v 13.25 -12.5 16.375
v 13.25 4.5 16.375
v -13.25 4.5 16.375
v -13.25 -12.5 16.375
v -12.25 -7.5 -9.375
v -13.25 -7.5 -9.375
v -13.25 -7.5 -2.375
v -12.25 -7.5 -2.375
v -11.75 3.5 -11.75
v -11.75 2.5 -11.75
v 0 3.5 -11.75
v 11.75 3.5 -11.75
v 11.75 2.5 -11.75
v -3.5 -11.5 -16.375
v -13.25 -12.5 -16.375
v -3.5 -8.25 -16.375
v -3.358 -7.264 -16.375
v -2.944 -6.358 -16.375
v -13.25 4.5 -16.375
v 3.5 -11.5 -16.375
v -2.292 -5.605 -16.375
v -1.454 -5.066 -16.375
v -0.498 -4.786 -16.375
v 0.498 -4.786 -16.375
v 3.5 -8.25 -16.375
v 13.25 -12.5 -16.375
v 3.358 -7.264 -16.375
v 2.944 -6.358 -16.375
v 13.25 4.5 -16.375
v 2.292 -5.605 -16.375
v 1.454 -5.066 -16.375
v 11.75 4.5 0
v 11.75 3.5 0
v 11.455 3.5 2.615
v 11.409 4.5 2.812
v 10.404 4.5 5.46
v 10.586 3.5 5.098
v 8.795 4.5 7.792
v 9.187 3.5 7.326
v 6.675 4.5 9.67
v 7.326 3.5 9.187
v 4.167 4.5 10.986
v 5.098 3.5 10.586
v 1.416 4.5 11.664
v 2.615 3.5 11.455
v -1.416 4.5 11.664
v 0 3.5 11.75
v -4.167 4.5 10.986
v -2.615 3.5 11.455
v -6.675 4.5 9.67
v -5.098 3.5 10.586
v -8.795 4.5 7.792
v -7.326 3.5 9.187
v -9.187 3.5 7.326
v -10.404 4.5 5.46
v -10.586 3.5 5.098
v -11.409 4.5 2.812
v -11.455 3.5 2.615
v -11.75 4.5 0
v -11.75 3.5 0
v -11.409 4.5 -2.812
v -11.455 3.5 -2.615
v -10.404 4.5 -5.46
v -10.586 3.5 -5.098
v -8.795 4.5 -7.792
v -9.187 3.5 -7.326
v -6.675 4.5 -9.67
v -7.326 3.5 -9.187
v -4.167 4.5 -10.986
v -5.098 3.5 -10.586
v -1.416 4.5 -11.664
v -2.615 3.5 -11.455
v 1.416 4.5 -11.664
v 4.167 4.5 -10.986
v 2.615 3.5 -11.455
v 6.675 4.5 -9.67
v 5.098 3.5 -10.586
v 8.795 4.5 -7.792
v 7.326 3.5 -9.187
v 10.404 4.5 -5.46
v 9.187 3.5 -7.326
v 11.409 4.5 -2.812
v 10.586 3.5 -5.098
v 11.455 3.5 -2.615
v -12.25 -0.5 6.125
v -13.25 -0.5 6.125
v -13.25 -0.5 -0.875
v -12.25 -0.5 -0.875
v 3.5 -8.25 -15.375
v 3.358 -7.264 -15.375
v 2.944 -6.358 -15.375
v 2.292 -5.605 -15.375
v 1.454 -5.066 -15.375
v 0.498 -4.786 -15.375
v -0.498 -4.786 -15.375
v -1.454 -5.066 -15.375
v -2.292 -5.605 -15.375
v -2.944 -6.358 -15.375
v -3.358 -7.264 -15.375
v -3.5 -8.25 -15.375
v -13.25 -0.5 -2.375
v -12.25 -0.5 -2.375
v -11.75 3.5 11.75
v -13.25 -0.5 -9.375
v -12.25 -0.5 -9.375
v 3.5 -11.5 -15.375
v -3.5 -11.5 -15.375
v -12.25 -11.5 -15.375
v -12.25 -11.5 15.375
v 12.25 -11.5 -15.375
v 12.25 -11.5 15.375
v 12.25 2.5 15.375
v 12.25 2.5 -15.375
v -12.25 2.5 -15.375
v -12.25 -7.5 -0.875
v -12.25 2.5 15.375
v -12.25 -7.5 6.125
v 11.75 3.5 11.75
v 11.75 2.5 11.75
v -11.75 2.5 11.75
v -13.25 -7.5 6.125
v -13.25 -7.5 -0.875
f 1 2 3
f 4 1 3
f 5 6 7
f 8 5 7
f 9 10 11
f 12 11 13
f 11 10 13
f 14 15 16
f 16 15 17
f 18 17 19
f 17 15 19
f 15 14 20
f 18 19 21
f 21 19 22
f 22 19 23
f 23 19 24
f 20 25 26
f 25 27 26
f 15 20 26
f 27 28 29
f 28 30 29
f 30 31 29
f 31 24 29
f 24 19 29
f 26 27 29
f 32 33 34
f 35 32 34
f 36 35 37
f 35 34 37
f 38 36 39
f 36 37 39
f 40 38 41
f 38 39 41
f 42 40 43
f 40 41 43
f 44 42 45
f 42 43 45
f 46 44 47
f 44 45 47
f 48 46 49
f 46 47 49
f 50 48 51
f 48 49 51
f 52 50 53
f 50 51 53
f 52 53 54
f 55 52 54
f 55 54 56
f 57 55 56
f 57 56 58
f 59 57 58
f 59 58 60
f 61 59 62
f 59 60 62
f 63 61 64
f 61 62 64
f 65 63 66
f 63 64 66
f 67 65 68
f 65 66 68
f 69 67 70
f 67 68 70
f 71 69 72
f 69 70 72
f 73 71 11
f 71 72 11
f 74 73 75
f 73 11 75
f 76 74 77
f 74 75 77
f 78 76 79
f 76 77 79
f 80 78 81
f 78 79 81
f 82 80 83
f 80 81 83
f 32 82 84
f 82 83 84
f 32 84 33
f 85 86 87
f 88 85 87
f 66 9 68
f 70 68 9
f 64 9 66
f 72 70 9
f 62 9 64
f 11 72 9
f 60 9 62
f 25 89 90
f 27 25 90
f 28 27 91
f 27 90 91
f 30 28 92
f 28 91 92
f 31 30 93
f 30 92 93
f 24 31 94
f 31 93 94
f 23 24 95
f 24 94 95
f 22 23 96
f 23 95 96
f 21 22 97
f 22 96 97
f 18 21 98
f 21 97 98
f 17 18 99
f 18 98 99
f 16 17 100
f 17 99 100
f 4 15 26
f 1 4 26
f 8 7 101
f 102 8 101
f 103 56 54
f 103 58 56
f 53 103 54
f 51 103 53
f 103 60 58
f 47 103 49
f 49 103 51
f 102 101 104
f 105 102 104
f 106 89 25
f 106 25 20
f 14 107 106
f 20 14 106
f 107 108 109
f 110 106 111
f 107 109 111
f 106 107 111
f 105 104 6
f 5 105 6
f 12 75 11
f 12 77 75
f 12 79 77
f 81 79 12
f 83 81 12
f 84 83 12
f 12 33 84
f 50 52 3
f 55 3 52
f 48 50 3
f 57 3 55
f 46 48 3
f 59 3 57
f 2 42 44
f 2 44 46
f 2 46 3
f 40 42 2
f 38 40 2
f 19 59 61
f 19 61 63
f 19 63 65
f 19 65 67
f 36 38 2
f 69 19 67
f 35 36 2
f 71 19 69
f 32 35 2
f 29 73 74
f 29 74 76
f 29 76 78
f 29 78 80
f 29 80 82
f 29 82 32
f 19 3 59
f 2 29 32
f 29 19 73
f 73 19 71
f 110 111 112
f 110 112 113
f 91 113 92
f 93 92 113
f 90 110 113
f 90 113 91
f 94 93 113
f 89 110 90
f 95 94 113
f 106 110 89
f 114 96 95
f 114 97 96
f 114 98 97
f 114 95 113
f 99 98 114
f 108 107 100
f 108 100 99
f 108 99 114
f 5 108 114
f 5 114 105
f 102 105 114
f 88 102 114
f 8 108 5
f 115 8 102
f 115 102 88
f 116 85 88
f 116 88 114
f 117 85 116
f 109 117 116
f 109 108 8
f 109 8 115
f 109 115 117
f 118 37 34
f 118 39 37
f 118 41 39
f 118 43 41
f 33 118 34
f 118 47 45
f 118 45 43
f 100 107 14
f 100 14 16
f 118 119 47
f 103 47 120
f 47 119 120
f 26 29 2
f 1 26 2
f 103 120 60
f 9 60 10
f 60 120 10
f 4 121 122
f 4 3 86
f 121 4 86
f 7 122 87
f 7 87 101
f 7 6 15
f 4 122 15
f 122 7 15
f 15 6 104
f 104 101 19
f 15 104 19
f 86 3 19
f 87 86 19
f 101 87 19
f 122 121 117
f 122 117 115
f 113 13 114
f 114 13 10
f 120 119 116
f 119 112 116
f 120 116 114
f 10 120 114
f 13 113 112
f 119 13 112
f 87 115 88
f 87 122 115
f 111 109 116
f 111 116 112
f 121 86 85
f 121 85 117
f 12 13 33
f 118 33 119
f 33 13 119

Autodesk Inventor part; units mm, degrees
ref_plane "YZ Plane" through (0, 0, 0) normal (1, 0, 0) x (0, 1, 0)
ref_plane "XZ Plane" through (0, 0, 0) normal (0, 1, 0) x (-1, 0, 0)
ref_plane "XY Plane" through (0, 0, 0) normal (0, 0, 1) x (1, 0, 0)
sketch "Sketch1" plane through (0, 0, 0) normal (0, 1, 0) x (-1, 0, 0)
  line L0 (-13.25, -16.375) -> (13.25, -16.375)
  line L1 (13.25, -16.375) -> (13.25, 16.375)
  line L2 (13.25, 16.375) -> (-13.25, 16.375)
  line L3 (-13.25, 16.375) -> (-13.25, -16.375)
  line L4 (-13.25, -16.375) -> (13.25, 16.375) construction
  line L5 (13.25, -16.375) -> (-13.25, 16.375) construction
  point P0 (0, 0)
  dimension "d0" = 26.5
  dimension "d1" = 32.75
extrude "Extrusion1" add sketch "Sketch1" along normal blind 3.5 and the other way blind 11.5
shell "Shell1" thickness 1 removed faces 1 at (4.4167, -11.5, 5.4583)
sketch "Sketch2" plane through (0, 3.5, 0) normal (0, 1, 0) x (1, 0, 0)
  line L0 (13.25, 16.375) -> (-13.25, 16.375) projected
  line L1 (-13.25, 16.375) -> (-13.25, -16.375) projected
  line L2 (-13.25, -16.375) -> (13.25, -16.375) projected
  line L3 (13.25, -16.375) -> (13.25, 16.375) projected
  point P0 (0, 0)
extrude "Extrusion2" add sketch "Sketch2" along normal blind 1
sketch "Sketch3" plane through (-12.25, 2.5, -15.375) normal (0, -1, 0) x (1, 0, 0)
  line L0 (24.5, 0) -> (0, 0) projected
  line L1 (24.5, 30.75) -> (24.5, 0) projected
  line L2 (0, 30.75) -> (24.5, 30.75) projected
  line L3 (0, 0) -> (0, 30.75) projected
  line L4 (0.5, 3.625) -> (24, 3.625)
  line L5 (24, 3.625) -> (24, 27.125)
  line L6 (24, 27.125) -> (0.5, 27.125)
  line L7 (0.5, 27.125) -> (0.5, 3.625)
  circle A0 centre (12.25, 15.375) radius 11.75
  dimension "d9" = 0.5
  dimension "d10" = 0.5
  dimension "d11" = 3.625
  dimension "d12" = 3.625
  dimension "d13" = 23.5
  dimension "d14" = 23.5
extrude "Extrusion3" cut sketch "Sketch3" against normal blind 1 contours L7 A0 L4 | A0 L5 L4 | A0 | L7 L6 A0 | A0 L6 L5
extrude "Extrusion4" cut sketch "Sketch3" against normal blind 2 contours A0
sketch "Sketch4" plane through (-12.25, -11.5, -15.375) normal (0, 0, 1) x (1, 0, 0)
  line L0 (24.5, 0) -> (0, 0) projected
  line L1 (8.75, 6.5) -> (15.75, 6.5)
  line L2 (15.75, 6.5) -> (15.75, 0)
  line L3 (15.75, 0) -> (8.75, 0)
  line L4 (8.75, 0) -> (8.75, 6.5)
  line L5 (8.75, 6.5) -> (15.75, 0) construction
  line L6 (15.75, 6.5) -> (8.75, 0) construction
  circle A0 centre (12.25, 3.25) radius 3.5
  line L7 (15.75, 3.25) -> (15.75, 3.25)
  line L8 (8.75, 3.25) -> (8.75, 3.25)
  point P0 (12.25, 11.5)
  point P1 (12.25, 3.25)
  point P2 (12.25, 0)
  point P3 (12.25, 0)
  point P4 (10.951, 0)
  point P5 (13.549, 0)
  point P6 (15.75, 0)
  point P7 (15.75, 3.25)
  point P8 (8.75, 3.25)
  point P9 (8.75, 0)
  dimension "d19" = 7
  dimension "d20" = 6.5
  dimension "d21" = 7
  dimension "d22" = 3.25
  dimension "d23" = 3.25
extrude "Extrusion5" cut sketch "Sketch4" against normal blind 2 contours L0 A0 L2 | A0 L0 | L0 A0 L1 | L0 L4 A0 | L1 A0
sketch "Sketch5" plane through (-13.25, -11.5, -16.375) normal (-1, 0, 0) x (0, 0, 1)
  line L0 (0, 16) -> (32.75, 16) projected
  line L1 (30, 11) -> (3.2984, 11)
  line L2 (7, 11) -> (7, 3)
  line L3 (1, 0) -> (1, 14) projected
  line L4 (7, 4) -> (14, 4)
  line L5 (14, 4) -> (14, 11)
  line L6 (15.5, 11) -> (22.5, 11)
  line L7 (22.5, 11) -> (22.5, 4)
  line L8 (22.5, 4) -> (15.5, 4)
  line L9 (15.5, 4) -> (15.5, 11)
  point P0 (16.375, 11.5)
  dimension "d26" = 5
  dimension "d27" = 6
  dimension "d28" = 7
  dimension "d29" = 7
  dimension "d30" = 7
  dimension "d31" = 7
  dimension "d32" = 1.5
extrude "Extrusion6" cut sketch "Sketch5" against normal blind 2
sketch "Sketch6" plane through (0, -11.5, 0) normal (0, -1, 0) x (1, 0, 0)
  line L0 (3.5, -16.375) -> (13.25, -16.375) projected
  line L1 (13.25, -16.375) -> (13.25, 16.375) projected
  line L2 (13.25, 16.375) -> (-13.25, 16.375) projected
  line L3 (-13.25, 16.375) -> (-13.25, -16.375) projected
  line L4 (-13.25, -16.375) -> (-3.5, -16.375) projected
  line L5 (13.25, 16.375) -> (-13.25, 16.375)
  line L6 (-13.25, 16.375) -> (-13.25, -16.375)
  line L7 (-13.25, -16.375) -> (13.25, -16.375)
  line L8 (13.25, -16.375) -> (13.25, 16.375)
  point P0 (0, 0)
extrude "Extrusion7" add sketch "Sketch6" along normal blind 1
properties part number "carcasaXeotype_COLOR"
